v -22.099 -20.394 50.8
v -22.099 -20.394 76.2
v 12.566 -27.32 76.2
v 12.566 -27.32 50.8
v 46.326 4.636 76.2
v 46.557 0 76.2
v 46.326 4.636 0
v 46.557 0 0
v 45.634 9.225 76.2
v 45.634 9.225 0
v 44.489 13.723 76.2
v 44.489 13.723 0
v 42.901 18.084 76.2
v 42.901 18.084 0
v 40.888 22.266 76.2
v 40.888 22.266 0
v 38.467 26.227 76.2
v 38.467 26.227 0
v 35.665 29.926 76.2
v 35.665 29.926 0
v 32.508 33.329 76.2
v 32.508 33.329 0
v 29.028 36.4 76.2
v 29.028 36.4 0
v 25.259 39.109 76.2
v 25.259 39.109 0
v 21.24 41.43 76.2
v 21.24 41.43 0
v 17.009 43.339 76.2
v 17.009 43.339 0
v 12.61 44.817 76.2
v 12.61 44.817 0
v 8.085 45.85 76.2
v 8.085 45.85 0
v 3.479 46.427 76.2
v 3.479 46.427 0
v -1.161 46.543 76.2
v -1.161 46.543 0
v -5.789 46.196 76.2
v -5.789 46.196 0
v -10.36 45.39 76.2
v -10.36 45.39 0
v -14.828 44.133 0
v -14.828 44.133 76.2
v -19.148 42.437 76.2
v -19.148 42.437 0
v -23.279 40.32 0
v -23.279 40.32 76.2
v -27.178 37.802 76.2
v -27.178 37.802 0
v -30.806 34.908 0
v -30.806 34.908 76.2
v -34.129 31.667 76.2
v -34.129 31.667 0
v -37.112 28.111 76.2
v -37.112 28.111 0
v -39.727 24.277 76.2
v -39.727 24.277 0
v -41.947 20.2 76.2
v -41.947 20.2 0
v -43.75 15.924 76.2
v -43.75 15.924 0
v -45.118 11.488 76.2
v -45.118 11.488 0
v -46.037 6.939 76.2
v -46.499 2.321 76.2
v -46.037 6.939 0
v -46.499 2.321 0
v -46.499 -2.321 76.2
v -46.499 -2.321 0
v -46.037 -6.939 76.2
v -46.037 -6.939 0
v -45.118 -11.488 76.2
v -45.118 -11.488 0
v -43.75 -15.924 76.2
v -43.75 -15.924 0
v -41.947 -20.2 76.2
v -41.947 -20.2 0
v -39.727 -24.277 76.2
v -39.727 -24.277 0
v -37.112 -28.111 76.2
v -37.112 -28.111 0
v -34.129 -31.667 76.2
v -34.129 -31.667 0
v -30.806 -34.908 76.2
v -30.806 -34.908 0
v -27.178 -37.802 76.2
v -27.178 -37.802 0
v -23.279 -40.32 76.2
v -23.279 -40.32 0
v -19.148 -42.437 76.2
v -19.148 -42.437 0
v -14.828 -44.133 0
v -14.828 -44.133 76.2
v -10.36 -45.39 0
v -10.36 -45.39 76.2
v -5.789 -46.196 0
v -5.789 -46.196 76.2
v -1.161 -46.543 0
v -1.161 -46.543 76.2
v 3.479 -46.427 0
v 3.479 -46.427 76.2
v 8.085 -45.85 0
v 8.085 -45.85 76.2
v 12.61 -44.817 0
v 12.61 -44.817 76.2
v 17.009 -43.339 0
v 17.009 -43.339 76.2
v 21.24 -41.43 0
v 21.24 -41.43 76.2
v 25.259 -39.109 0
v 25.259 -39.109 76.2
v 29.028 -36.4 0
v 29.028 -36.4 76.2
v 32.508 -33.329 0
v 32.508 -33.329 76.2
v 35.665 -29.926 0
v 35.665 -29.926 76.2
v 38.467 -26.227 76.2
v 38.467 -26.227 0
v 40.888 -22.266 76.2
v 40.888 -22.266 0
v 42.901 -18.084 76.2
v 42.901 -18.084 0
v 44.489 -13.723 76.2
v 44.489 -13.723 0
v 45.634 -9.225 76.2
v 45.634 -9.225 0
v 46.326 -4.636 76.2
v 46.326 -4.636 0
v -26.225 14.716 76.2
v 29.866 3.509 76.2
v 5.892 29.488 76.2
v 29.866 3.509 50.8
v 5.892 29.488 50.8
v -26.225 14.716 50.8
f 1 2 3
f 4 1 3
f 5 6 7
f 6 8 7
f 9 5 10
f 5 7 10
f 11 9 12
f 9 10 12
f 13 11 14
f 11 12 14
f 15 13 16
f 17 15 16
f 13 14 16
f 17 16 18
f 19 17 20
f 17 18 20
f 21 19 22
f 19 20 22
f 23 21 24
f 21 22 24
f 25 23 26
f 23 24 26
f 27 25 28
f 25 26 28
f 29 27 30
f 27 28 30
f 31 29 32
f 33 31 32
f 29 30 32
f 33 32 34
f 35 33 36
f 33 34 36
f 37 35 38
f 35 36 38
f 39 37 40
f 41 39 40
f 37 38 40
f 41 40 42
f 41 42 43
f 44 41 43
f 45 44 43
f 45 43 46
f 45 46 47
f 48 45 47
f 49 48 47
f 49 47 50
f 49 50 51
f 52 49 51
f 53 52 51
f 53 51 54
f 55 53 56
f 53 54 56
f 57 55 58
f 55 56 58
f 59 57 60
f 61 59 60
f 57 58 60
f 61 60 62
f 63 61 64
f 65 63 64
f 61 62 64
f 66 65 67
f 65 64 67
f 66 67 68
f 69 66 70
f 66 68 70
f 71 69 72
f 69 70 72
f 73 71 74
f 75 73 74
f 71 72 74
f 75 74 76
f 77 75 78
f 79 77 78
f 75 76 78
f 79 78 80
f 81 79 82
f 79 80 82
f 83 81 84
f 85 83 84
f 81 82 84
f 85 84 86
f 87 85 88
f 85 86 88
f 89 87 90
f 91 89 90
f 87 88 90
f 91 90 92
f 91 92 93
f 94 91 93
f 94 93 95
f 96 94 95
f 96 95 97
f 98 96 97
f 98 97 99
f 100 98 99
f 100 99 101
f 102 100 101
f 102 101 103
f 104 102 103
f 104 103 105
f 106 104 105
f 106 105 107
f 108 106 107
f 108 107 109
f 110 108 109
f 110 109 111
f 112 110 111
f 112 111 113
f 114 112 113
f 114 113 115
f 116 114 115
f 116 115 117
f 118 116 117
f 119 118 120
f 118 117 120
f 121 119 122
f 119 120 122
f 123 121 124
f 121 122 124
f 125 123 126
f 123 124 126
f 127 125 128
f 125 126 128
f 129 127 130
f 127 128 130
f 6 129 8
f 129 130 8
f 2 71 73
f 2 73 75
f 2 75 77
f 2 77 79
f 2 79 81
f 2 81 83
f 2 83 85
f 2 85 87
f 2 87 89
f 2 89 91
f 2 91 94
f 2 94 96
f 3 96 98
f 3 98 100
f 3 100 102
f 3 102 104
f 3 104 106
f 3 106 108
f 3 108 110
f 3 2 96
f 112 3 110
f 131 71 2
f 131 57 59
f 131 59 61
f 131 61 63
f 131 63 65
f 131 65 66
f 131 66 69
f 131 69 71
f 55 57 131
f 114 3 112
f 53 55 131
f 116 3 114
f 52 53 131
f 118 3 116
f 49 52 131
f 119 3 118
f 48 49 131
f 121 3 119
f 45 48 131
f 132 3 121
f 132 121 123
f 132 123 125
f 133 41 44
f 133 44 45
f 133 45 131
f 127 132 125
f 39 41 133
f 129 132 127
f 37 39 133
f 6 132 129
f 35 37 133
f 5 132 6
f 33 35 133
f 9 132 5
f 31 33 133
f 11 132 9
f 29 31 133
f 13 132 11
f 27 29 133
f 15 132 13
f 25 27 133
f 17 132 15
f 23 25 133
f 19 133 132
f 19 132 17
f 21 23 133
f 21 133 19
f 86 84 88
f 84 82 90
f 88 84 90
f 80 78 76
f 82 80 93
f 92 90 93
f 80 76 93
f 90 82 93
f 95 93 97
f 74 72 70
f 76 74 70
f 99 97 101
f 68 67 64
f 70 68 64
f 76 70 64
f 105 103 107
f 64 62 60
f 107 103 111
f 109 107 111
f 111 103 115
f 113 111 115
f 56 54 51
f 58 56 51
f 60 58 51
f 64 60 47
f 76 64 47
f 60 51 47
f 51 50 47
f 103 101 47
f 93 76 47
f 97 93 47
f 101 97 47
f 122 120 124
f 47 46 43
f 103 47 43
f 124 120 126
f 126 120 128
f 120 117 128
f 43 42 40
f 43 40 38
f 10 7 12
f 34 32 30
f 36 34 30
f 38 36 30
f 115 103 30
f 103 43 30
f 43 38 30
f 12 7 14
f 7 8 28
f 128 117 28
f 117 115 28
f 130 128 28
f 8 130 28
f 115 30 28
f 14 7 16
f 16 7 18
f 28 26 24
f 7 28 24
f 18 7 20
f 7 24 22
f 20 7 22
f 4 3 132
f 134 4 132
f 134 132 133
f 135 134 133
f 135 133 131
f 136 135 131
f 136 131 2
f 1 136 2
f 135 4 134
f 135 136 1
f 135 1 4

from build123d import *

# Parameters (mm, degrees)
F0_R          = 46.5572685797
F1_DEPTH      = 25.4
F2_R          = 46.5572685797
F3_DEPTH      = 25.4
F3_DEPTH_BACK = 25.4
F4_R          = 46.5572685797
F5_DEPTH      = 25.4
F8_DEPTH      = 25.4
F9_DEPTH      = 25.4


with BuildPart() as f1:
    # F0 (on Top) → F1 (new body)
    with BuildSketch(Plane.XY):
        Circle(F0_R)
    extrude(amount=F1_DEPTH)

    # F2 (on face) → F3 (join, two sides)
    with BuildSketch(Plane.XY.offset(25.4)) as f3_sk:
        Circle(F2_R)
    extrude(amount=F3_DEPTH)
    extrude(f3_sk.sketch, amount=-F3_DEPTH_BACK)

    # F4 (on face) → F5 (join)
    with BuildSketch(Plane.XY.offset(50.8)):
        Circle(F4_R)
    extrude(amount=F5_DEPTH)

    # F6 (on face) → F8 (cut)
    with BuildSketch(Plane.XY.offset(76.2)):
        Polygon((12.566284557, -27.3198056045), (29.8658746284, 3.5089625988), (5.8918410671, 29.4884637558), (-26.2245165926, 14.7159102784), (-22.0994836598, -20.3935310284), align=None)
    extrude(amount=-F8_DEPTH, mode=Mode.SUBTRACT)

    # F7 (on face) → F9 (cut)
    with BuildSketch(Plane.XY):
        Polygon((-22.0994836598, -20.3935310284), (12.566284557, -27.3198056045), (29.8658746284, 3.5089625988), (5.8918410671, 29.4884637558), (-26.2245165926, 14.7159102784), align=None)
    extrude(amount=-F9_DEPTH, mode=Mode.SUBTRACT)


solid = f1.part
